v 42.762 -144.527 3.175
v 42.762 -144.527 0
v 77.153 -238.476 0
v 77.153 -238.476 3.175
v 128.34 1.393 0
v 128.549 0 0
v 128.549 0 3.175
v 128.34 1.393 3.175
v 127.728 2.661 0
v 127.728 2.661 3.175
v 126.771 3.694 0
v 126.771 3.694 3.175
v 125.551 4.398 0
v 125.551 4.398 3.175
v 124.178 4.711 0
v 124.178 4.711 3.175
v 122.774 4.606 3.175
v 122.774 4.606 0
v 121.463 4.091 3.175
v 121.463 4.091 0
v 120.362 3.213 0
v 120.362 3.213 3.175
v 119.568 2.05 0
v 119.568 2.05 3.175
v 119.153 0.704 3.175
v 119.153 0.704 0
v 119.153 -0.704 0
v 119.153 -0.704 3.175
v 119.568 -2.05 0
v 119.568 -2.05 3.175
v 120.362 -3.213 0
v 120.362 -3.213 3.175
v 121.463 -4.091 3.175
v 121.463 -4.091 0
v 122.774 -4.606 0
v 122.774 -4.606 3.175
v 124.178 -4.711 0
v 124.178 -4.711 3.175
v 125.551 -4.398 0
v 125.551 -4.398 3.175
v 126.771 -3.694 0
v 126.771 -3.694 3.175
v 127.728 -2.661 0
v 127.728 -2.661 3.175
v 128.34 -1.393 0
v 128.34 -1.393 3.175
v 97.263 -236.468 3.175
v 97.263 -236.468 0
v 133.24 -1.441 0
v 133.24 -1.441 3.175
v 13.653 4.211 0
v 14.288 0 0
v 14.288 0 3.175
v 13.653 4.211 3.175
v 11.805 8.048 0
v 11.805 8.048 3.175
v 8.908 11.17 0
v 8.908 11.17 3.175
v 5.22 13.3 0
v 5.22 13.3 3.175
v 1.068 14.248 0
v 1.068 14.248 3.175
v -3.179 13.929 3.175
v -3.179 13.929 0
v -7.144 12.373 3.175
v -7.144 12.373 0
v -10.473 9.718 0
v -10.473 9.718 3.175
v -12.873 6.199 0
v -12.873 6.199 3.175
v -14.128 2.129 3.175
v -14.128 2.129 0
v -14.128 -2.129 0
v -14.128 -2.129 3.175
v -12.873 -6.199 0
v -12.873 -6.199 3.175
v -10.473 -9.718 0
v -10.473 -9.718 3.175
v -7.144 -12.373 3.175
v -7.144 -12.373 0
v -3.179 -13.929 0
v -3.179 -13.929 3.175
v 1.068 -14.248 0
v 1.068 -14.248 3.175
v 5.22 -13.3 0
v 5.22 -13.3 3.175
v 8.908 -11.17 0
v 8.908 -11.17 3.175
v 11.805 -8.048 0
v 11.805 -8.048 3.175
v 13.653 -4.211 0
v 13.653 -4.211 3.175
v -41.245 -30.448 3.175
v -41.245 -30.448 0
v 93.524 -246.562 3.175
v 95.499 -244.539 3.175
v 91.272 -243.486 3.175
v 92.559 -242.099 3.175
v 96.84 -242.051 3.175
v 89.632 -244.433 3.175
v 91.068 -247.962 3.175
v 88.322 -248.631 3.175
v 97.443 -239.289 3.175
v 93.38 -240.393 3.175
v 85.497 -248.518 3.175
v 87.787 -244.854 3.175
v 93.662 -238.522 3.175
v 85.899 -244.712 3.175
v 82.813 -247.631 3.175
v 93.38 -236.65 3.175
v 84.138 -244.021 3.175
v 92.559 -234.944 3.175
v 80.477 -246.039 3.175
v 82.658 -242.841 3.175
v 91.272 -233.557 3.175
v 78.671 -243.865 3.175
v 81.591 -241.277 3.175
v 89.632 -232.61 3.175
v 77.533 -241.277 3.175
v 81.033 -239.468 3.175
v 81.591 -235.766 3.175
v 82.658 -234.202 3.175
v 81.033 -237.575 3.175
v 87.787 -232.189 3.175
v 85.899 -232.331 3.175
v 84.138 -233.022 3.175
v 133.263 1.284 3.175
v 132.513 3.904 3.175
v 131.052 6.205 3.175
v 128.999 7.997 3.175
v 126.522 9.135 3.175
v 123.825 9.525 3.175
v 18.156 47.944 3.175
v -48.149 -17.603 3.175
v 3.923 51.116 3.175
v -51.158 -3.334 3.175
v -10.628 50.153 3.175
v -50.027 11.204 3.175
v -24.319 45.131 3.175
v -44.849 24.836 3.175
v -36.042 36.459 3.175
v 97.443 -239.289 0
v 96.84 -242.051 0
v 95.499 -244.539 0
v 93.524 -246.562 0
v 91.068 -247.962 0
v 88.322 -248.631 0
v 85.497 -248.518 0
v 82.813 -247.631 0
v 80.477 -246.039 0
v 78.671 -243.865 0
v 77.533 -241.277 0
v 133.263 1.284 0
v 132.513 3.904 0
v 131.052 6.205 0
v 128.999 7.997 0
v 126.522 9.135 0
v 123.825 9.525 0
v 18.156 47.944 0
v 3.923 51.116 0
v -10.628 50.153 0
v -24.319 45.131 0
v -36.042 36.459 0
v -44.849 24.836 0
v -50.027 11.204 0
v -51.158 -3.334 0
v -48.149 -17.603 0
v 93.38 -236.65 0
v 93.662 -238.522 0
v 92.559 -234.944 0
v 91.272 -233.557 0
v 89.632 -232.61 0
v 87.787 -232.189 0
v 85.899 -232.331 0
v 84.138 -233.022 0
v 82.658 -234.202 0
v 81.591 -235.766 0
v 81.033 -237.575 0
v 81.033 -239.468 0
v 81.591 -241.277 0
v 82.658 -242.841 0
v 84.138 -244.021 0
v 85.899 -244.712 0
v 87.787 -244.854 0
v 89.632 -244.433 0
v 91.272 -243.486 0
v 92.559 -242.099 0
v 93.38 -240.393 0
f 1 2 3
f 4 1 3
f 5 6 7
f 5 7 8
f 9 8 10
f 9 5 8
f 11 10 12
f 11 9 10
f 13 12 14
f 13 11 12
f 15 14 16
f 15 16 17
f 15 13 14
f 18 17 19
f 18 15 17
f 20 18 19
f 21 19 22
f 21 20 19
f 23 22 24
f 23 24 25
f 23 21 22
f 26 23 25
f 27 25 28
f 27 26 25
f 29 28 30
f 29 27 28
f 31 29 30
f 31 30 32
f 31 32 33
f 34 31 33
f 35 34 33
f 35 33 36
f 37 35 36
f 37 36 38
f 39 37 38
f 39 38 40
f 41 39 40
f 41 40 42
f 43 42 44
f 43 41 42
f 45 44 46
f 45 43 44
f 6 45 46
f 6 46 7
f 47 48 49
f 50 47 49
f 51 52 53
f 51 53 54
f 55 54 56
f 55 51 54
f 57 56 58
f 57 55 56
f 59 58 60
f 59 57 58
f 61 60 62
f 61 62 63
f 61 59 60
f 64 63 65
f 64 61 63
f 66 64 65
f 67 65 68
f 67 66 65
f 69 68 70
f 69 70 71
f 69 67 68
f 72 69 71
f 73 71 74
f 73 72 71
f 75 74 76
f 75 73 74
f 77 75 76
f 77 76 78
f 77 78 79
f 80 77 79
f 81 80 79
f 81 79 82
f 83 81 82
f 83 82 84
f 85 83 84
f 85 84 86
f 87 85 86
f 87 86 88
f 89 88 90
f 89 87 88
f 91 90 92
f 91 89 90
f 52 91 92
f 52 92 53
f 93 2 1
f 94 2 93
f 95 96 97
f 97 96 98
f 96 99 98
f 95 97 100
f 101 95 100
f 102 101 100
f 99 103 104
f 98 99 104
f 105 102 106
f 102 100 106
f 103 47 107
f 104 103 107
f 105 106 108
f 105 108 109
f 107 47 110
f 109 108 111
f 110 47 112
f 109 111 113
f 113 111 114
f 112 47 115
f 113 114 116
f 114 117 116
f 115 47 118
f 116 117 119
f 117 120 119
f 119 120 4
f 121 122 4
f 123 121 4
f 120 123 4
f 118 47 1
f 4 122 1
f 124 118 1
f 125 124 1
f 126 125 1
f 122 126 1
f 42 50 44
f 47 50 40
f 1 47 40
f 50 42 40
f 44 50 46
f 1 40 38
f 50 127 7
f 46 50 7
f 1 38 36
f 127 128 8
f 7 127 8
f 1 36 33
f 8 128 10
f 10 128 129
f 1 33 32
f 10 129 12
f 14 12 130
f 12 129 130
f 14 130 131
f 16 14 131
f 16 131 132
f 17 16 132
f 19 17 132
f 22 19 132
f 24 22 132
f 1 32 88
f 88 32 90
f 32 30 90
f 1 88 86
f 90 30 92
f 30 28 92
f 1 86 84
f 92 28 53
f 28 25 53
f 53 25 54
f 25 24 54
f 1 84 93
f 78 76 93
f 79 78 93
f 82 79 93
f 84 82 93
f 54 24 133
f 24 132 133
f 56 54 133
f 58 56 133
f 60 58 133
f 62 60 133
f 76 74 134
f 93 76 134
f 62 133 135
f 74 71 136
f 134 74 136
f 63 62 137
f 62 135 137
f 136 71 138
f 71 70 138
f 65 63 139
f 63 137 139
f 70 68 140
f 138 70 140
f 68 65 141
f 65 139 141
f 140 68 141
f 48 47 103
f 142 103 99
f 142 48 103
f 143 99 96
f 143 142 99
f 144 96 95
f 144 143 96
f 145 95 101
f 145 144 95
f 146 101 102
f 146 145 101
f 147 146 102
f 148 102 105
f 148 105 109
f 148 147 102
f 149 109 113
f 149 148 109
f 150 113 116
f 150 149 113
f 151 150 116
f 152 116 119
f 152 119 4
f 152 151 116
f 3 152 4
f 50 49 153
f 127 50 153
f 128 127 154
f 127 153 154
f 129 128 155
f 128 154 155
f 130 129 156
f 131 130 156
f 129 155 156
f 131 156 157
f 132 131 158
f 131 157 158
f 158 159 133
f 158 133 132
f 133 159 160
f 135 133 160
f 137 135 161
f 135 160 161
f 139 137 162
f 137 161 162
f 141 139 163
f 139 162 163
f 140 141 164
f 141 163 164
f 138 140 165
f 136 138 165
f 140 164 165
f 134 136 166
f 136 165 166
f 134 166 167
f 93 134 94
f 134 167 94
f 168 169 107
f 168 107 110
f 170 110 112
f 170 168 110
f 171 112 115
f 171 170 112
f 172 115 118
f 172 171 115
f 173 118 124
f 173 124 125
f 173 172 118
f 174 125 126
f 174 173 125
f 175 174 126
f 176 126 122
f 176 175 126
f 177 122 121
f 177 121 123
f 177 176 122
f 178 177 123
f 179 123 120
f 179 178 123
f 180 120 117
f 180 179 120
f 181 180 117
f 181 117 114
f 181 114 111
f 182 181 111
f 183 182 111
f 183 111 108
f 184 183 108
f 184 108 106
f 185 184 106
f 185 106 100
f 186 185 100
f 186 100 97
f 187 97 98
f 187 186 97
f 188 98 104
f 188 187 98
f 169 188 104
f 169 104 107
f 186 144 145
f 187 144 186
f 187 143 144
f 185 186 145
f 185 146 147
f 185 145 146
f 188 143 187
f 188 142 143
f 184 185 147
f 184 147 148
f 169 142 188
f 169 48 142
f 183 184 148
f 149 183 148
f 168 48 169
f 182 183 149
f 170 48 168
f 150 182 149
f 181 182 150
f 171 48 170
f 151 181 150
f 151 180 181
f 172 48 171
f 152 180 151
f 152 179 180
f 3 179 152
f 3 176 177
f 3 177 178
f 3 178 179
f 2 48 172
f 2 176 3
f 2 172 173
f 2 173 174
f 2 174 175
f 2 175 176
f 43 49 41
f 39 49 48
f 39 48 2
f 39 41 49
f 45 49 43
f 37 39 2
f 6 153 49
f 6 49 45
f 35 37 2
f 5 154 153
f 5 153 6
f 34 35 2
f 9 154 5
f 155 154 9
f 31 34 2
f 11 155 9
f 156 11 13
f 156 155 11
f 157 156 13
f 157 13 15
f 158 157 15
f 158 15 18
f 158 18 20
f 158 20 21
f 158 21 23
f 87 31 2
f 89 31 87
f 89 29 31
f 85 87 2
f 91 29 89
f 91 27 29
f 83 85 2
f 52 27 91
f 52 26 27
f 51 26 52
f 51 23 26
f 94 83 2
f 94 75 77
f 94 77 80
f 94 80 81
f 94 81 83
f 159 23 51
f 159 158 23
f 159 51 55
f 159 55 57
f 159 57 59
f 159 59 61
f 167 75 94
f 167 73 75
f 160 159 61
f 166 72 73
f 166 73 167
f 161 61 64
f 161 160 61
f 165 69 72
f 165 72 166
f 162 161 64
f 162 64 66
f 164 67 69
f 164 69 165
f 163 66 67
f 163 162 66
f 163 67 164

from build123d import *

# Parameters (mm, degrees)
SKETCH1_R           = 6.35
SKETCH1_R_2         = 4.7244
SKETCH1_R_3         = 14.2875
BOSS_EXTRUDE1_DEPTH = 3.175
SKETCH2_R           = 10.16
SKETCH2_R_2         = 9.525
BOSS_EXTRUDE2_DEPTH = 3.175
BOSS_EXTRUDE3_DEPTH = 3.175


with BuildPart() as part:
    # Sketch1 → Boss-Extrude1 (new body)
    with BuildSketch(Plane.XY):
        with BuildLine():
            Line((123.825, 9.525), (50.373687682, 9.525))
            ThreePointArc((50.373687682, 9.525), (-42.021955485, 29.366465449), (8.37139721, -50.578194358))
            Line((8.37139721, -50.578194358), (78.367942069, -241.795763571))
            ThreePointArc((78.367942069, -241.795763571), (88.258712803, -247.99942994), (96.727824138, -239.962827716))
            Line((96.727824138, -239.962827716), (133.240324138, -1.441282895))
            ThreePointArc((133.240324138, -1.441282895), (131.051819652, 6.204732284), (123.825, 9.525))
        make_face()
        with Locations((87.3125, -238.521544821)):
            Circle(SKETCH1_R, mode=Mode.SUBTRACT)
        with Locations((123.825, 0)):
            Circle(SKETCH1_R_2, mode=Mode.SUBTRACT)
        Circle(SKETCH1_R_3, mode=Mode.SUBTRACT)
    extrude(amount=BOSS_EXTRUDE1_DEPTH)

    # Sketch2 → Boss-Extrude2 (add)
    with BuildSketch(Plane(origin=(0, 0, 0), x_dir=(-1, 0, 0), z_dir=(0, 0, -1))):
        with Locations((-87.3125, -238.521544821)):
            Circle(SKETCH2_R)
        with Locations((-87.3125, -238.521544821)):
            Circle(SKETCH2_R_2, mode=Mode.SUBTRACT)
    extrude(amount=-BOSS_EXTRUDE2_DEPTH)

    # Sketch3 → Boss-Extrude3 (add)
    with BuildSketch(Plane(origin=(0, 0, 0), x_dir=(-1, 0, 0), z_dir=(0, 0, -1))):
        with BuildLine():
            ThreePointArc((-50.373687682, 9.525), (-39.281923062, 32.941835958), (-18.155694858, 47.943766852))
            Line((-18.155694858, 47.943766852), (-123.825, 9.525))
            Line((-123.825, 9.525), (-50.373687682, 9.525))
        make_face()
        with BuildLine():
            Line((-8.37139721, -50.578194358), (-42.762000357, -144.526939268))
            Line((-42.762000357, -144.526939268), (41.245405611, -30.447504852))
            ThreePointArc((41.245405611, -30.447504852), (19.273979145, -47.505239328), (-8.37139721, -50.578194358))
        make_face()
    extrude(amount=-BOSS_EXTRUDE3_DEPTH)


solid = part.part
